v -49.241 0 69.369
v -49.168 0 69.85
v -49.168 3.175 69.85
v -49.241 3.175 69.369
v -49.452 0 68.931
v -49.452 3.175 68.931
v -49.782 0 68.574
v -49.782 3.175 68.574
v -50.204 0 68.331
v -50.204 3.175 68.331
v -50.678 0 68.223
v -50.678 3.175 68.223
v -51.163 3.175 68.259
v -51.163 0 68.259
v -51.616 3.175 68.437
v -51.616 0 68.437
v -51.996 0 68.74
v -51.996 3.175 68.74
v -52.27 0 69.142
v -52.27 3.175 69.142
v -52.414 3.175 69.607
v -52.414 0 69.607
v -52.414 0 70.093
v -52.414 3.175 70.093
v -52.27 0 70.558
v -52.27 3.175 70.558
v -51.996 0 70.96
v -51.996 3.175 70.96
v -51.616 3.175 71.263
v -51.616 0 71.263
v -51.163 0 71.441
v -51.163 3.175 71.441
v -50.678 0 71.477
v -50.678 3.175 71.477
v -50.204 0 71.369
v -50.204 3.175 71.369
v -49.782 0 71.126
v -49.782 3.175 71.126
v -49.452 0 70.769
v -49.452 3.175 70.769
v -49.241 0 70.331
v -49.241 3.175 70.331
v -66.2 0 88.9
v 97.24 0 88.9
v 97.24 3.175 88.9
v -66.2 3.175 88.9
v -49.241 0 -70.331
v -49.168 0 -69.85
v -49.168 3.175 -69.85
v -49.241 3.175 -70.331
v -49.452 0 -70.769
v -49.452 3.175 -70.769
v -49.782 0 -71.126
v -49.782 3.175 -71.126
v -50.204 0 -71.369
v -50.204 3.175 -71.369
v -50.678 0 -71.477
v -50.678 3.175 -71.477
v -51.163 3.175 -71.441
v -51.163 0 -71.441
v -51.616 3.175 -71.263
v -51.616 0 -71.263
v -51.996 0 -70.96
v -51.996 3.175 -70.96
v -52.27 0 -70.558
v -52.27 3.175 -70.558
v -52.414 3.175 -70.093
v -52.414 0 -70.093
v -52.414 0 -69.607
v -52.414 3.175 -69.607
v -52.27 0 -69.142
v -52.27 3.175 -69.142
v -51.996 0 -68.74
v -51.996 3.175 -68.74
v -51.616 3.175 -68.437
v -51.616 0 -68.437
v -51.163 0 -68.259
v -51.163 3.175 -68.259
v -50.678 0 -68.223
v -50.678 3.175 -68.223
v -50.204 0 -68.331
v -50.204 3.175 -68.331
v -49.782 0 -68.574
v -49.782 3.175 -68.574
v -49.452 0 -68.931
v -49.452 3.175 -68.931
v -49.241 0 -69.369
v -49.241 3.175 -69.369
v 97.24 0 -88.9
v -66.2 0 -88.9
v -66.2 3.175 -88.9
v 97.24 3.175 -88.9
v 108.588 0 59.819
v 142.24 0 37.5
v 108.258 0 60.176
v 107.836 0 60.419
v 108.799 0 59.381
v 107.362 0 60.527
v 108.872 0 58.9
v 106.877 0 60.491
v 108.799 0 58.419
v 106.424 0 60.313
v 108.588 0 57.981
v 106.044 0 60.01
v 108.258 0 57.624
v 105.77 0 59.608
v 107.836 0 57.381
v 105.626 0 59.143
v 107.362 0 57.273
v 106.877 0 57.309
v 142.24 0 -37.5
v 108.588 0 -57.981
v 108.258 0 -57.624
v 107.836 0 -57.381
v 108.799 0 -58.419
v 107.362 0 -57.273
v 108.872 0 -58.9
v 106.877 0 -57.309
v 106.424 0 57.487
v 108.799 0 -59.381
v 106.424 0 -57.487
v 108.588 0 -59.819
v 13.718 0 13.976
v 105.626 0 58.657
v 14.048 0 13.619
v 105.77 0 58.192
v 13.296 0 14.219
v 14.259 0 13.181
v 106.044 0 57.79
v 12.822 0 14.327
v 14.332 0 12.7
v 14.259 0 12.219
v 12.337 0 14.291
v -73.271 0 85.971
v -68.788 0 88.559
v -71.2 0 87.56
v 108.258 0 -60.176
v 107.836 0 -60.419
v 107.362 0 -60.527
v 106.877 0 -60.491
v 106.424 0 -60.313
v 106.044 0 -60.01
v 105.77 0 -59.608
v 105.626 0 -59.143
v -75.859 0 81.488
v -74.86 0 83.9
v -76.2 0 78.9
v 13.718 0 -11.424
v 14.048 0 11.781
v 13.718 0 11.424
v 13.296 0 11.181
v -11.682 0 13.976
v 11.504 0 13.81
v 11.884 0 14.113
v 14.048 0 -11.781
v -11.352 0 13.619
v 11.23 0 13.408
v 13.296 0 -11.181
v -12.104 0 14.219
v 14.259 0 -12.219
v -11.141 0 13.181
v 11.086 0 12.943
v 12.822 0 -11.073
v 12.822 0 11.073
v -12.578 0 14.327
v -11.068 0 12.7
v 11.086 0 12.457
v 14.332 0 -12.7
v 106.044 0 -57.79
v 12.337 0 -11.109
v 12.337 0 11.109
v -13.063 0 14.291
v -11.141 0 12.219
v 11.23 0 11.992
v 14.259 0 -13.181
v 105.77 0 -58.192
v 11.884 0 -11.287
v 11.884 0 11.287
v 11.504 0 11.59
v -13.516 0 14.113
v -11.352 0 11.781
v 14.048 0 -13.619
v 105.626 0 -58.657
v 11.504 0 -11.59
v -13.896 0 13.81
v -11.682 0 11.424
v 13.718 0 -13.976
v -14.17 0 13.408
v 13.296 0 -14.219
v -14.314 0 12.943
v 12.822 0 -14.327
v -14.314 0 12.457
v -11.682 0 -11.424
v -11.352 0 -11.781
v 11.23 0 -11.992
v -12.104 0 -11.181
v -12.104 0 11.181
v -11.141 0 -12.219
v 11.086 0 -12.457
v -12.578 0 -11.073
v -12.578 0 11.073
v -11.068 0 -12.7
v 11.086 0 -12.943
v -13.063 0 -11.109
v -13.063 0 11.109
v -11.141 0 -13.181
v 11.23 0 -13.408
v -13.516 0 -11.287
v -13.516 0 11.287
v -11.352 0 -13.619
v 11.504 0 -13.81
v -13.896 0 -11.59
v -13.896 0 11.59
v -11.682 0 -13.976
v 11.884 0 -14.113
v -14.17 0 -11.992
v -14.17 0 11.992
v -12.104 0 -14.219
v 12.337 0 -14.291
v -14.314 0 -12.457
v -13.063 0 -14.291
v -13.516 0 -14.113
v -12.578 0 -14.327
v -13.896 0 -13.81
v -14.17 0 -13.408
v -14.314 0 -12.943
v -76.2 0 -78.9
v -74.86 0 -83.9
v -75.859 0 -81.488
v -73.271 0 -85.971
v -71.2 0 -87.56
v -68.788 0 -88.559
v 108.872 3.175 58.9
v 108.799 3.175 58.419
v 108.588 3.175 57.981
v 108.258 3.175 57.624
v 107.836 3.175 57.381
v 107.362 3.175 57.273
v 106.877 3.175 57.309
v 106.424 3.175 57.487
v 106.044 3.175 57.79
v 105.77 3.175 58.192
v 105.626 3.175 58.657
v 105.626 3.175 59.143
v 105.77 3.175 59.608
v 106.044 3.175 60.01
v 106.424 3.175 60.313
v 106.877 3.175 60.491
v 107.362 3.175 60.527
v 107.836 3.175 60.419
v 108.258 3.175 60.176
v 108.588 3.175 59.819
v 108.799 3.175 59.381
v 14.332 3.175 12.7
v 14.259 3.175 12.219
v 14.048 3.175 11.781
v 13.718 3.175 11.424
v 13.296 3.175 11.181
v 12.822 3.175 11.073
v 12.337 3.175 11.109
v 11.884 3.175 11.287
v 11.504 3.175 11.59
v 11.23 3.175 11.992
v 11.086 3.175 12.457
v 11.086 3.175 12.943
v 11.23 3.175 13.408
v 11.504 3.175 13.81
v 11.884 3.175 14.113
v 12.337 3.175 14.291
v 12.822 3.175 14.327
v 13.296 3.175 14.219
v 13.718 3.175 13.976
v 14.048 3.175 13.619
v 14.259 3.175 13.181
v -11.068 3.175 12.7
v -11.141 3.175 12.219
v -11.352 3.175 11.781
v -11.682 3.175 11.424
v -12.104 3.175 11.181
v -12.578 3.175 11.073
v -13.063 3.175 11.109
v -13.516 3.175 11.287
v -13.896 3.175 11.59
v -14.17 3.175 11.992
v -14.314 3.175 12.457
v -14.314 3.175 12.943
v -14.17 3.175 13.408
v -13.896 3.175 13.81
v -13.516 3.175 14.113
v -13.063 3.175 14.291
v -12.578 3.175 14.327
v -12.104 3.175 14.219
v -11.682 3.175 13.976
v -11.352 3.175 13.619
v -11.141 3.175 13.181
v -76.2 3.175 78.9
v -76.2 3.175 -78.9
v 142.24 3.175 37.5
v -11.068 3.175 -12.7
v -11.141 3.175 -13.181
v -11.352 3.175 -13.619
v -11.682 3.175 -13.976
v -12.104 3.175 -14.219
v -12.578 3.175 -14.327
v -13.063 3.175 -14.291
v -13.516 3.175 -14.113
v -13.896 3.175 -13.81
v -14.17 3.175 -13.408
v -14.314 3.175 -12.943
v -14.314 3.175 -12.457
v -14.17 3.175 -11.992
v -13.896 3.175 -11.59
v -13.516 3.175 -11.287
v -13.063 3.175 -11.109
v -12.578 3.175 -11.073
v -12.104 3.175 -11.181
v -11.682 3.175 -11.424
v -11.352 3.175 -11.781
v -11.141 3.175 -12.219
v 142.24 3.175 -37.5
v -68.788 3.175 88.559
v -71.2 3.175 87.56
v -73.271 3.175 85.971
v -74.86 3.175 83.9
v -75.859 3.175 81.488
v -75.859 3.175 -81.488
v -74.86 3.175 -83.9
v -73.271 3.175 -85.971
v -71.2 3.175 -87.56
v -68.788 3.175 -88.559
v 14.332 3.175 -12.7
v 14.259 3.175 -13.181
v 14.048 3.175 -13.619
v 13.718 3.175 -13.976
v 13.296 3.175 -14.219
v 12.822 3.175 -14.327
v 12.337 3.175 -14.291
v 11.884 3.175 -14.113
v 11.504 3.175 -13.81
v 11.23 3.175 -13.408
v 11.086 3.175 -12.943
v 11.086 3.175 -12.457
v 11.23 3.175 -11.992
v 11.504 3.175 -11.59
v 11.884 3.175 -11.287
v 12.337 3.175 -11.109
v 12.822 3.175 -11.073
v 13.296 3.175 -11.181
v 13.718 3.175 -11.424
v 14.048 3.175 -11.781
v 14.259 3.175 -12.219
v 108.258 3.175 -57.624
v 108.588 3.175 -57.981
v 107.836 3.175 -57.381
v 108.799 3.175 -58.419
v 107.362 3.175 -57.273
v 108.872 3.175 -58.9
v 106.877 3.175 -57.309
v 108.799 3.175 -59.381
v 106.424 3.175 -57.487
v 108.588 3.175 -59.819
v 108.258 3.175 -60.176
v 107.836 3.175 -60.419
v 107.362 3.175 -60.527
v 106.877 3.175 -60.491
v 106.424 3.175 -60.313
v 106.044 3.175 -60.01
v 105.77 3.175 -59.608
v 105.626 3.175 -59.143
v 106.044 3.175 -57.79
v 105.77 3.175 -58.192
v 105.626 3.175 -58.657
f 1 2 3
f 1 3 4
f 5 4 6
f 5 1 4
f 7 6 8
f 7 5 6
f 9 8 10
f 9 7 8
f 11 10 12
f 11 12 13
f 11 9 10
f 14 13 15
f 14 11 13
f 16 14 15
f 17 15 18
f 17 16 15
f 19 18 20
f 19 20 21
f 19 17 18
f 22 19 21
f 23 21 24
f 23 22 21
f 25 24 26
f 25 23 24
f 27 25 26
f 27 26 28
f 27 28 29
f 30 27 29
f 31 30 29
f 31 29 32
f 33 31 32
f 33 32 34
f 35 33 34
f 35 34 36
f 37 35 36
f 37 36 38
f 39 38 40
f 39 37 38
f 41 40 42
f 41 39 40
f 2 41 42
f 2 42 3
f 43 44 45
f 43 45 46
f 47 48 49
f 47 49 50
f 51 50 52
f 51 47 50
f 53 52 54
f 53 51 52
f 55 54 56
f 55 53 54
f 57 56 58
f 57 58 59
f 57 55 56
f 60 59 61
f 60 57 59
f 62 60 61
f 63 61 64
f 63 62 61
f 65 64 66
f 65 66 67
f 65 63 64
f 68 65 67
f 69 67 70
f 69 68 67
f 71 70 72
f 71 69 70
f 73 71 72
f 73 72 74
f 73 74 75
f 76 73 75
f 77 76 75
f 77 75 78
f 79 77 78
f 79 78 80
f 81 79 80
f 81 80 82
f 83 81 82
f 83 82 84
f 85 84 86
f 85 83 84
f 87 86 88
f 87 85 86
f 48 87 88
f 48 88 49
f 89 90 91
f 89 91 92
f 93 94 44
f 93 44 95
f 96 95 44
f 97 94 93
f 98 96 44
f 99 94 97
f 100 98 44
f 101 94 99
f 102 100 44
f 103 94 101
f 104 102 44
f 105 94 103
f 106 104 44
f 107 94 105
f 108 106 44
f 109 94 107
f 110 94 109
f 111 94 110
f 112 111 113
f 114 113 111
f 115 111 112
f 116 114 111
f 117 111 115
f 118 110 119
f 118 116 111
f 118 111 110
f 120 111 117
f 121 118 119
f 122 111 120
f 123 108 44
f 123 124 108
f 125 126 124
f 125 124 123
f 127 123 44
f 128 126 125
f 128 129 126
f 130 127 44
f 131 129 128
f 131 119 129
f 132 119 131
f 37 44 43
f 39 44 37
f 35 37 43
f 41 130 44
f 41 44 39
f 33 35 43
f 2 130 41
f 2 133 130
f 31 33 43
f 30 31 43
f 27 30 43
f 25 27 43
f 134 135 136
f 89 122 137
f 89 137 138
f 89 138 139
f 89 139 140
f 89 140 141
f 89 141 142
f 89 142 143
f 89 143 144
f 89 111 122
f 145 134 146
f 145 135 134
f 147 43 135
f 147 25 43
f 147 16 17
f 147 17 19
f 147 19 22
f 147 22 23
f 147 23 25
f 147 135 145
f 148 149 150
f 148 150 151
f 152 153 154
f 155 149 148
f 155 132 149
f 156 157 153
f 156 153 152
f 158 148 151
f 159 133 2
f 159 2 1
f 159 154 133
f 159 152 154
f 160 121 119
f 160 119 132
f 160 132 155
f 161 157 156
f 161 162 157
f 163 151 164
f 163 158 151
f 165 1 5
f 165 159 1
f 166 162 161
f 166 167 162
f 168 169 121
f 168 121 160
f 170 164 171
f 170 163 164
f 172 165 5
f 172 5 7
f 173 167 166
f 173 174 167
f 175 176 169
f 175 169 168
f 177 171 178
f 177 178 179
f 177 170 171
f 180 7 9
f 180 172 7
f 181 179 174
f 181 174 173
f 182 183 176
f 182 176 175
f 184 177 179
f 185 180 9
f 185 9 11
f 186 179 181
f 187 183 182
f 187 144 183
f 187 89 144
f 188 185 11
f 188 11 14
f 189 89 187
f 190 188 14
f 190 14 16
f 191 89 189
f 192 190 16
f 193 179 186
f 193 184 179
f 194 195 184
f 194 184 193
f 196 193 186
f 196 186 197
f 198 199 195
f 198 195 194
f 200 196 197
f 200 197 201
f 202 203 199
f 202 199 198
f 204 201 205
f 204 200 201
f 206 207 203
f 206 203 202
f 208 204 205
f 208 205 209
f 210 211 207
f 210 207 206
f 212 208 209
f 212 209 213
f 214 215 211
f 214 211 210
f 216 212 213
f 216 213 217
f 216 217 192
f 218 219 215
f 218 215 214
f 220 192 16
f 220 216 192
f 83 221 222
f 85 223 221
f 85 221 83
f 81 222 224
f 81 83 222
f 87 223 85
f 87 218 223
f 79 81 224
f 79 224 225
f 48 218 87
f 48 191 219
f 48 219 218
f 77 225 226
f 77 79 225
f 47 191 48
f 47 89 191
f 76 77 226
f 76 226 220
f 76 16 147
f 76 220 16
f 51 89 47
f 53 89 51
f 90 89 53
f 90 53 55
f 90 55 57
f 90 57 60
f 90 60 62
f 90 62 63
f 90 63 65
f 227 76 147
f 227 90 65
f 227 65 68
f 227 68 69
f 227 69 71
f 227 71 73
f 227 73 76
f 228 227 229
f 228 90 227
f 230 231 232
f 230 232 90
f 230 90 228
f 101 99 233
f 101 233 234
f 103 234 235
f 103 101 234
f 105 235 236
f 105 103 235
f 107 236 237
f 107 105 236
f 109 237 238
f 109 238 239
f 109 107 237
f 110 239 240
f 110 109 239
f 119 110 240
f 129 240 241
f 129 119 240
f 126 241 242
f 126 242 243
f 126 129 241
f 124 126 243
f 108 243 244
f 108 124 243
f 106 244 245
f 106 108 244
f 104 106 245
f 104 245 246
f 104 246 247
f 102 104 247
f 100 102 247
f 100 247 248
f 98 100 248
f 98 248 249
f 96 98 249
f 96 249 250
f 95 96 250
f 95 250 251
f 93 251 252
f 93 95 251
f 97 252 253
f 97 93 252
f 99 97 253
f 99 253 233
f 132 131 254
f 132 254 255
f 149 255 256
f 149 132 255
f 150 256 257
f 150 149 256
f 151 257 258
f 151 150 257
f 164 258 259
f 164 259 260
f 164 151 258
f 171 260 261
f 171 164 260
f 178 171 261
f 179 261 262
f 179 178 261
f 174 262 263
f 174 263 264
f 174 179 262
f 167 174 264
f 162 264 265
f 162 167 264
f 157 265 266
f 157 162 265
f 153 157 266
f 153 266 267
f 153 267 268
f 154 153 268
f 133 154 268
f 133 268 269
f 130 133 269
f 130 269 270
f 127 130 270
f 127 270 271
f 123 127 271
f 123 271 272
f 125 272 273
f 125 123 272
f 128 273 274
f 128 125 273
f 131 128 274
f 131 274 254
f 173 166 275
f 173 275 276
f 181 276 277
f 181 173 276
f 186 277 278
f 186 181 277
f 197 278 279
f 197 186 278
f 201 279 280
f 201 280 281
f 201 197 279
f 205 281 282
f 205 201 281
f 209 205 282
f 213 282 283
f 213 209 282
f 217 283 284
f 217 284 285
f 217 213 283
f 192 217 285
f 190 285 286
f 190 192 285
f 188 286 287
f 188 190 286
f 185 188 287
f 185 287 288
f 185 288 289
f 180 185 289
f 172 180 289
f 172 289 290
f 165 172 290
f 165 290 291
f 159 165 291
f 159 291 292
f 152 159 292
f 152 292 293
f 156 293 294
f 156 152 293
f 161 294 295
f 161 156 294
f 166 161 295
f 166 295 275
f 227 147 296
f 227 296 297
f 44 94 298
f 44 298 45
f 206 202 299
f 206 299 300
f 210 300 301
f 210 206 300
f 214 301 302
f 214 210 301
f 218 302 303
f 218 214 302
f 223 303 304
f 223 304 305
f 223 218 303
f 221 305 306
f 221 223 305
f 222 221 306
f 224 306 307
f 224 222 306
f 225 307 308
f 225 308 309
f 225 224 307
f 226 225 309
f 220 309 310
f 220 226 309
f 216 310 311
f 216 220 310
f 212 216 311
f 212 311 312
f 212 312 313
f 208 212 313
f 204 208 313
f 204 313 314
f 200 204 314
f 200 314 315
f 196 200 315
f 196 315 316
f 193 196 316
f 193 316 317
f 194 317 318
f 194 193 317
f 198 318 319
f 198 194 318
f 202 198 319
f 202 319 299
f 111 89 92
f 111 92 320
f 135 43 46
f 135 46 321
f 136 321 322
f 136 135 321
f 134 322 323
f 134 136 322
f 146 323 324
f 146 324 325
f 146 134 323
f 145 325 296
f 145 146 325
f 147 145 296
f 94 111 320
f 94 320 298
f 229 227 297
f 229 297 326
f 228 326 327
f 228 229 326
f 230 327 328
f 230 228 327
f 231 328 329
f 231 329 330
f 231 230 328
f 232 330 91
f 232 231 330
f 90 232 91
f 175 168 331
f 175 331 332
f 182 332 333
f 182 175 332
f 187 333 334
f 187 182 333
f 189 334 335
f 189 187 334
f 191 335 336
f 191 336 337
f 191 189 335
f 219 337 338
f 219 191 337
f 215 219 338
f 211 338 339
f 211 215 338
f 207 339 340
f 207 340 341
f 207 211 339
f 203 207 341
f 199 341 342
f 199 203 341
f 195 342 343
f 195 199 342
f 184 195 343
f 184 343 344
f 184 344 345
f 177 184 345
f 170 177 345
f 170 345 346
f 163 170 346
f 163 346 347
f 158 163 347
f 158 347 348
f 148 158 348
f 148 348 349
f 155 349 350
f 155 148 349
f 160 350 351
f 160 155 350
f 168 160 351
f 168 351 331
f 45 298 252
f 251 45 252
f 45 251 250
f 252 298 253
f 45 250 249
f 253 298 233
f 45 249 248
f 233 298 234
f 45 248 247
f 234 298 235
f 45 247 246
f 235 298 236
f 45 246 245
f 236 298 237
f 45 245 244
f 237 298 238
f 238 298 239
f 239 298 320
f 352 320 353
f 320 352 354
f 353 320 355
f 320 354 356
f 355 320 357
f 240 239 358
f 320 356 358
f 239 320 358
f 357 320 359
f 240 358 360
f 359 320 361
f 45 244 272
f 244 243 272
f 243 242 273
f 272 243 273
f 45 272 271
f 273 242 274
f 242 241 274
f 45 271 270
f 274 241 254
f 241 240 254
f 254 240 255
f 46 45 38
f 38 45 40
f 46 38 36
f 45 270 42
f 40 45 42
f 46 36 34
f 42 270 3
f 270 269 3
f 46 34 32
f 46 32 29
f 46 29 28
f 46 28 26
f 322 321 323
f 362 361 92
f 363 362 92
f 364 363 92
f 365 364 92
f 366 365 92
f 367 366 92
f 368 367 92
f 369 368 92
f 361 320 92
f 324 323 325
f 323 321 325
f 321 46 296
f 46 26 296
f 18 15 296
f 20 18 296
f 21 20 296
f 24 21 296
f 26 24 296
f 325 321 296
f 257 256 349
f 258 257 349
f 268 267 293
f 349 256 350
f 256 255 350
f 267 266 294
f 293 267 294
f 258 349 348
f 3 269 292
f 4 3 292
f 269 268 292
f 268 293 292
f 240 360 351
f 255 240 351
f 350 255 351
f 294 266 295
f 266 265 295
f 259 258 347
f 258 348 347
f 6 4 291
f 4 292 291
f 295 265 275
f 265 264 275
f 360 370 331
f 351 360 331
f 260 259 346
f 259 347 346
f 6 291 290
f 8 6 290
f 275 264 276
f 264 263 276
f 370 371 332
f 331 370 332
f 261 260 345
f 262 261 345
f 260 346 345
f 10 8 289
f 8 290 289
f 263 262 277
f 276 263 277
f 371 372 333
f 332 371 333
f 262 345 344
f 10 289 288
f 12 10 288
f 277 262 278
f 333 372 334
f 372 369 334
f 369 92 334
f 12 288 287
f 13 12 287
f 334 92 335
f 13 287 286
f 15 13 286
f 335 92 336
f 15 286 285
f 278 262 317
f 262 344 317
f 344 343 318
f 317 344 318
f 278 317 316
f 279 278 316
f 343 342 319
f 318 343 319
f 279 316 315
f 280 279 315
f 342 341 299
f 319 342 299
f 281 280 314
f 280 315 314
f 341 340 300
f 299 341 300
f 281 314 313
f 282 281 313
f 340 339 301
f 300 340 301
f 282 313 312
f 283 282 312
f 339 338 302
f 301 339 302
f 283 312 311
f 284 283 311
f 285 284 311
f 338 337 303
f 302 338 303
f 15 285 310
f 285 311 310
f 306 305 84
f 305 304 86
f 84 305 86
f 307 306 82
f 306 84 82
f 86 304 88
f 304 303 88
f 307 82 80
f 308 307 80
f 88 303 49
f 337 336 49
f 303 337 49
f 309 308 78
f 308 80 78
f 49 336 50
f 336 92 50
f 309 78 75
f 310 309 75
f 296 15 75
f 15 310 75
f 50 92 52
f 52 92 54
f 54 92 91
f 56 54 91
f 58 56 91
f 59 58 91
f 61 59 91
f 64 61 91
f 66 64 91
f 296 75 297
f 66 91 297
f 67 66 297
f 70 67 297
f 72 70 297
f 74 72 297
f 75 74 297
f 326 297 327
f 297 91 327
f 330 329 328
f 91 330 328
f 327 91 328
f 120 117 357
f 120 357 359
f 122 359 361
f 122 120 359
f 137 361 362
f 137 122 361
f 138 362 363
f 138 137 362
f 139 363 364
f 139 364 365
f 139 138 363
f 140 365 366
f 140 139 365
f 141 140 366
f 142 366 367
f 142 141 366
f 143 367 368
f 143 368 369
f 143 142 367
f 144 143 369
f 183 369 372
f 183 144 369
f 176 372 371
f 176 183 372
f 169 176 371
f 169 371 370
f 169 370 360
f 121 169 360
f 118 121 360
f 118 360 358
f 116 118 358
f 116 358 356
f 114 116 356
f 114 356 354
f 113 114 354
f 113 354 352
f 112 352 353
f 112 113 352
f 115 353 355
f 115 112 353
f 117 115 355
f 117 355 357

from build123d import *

# Parameters (mm, degrees)
SKETCH1_R           = 1.63195
BOSS_EXTRUDE1_DEPTH = 3.175


with BuildPart() as part:
    # Sketch1 → Boss-Extrude1 (new body)
    with BuildSketch(Plane(origin=(0, 0, 0), x_dir=(1, 0, 0), z_dir=(0, 1, 0))):
        with BuildLine():
            Line((-66.2, 88.9), (97.24, 88.9))
            Line((97.24, 88.9), (142.24, 37.5))
            Line((142.24, 37.5), (142.24, -37.5))
            Line((142.24, -37.5), (97.24, -88.9))
            Line((97.24, -88.9), (-66.2, -88.9))
            ThreePointArc((-66.2, -88.9), (-73.271067812, -85.971067812), (-76.2, -78.9))
            Line((-76.2, -78.9), (-76.2, 78.9))
            ThreePointArc((-76.2, 78.9), (-73.271067812, 85.971067812), (-66.2, 88.9))
        make_face()
        with Locations((-12.7, 12.7)):
            Circle(SKETCH1_R, mode=Mode.SUBTRACT)
        with Locations((12.7, 12.7)):
            Circle(SKETCH1_R, mode=Mode.SUBTRACT)
        with Locations((12.7, -12.7)):
            Circle(SKETCH1_R, mode=Mode.SUBTRACT)
        with Locations((-12.7, -12.7)):
            Circle(SKETCH1_R, mode=Mode.SUBTRACT)
        with Locations((-50.8, 69.85)):
            Circle(SKETCH1_R, mode=Mode.SUBTRACT)
        with Locations((107.24, 58.9)):
            Circle(SKETCH1_R, mode=Mode.SUBTRACT)
        with Locations((107.24, -58.9)):
            Circle(SKETCH1_R, mode=Mode.SUBTRACT)
        with Locations((-50.8, -69.85)):
            Circle(SKETCH1_R, mode=Mode.SUBTRACT)
    extrude(amount=BOSS_EXTRUDE1_DEPTH)


solid = part.part
